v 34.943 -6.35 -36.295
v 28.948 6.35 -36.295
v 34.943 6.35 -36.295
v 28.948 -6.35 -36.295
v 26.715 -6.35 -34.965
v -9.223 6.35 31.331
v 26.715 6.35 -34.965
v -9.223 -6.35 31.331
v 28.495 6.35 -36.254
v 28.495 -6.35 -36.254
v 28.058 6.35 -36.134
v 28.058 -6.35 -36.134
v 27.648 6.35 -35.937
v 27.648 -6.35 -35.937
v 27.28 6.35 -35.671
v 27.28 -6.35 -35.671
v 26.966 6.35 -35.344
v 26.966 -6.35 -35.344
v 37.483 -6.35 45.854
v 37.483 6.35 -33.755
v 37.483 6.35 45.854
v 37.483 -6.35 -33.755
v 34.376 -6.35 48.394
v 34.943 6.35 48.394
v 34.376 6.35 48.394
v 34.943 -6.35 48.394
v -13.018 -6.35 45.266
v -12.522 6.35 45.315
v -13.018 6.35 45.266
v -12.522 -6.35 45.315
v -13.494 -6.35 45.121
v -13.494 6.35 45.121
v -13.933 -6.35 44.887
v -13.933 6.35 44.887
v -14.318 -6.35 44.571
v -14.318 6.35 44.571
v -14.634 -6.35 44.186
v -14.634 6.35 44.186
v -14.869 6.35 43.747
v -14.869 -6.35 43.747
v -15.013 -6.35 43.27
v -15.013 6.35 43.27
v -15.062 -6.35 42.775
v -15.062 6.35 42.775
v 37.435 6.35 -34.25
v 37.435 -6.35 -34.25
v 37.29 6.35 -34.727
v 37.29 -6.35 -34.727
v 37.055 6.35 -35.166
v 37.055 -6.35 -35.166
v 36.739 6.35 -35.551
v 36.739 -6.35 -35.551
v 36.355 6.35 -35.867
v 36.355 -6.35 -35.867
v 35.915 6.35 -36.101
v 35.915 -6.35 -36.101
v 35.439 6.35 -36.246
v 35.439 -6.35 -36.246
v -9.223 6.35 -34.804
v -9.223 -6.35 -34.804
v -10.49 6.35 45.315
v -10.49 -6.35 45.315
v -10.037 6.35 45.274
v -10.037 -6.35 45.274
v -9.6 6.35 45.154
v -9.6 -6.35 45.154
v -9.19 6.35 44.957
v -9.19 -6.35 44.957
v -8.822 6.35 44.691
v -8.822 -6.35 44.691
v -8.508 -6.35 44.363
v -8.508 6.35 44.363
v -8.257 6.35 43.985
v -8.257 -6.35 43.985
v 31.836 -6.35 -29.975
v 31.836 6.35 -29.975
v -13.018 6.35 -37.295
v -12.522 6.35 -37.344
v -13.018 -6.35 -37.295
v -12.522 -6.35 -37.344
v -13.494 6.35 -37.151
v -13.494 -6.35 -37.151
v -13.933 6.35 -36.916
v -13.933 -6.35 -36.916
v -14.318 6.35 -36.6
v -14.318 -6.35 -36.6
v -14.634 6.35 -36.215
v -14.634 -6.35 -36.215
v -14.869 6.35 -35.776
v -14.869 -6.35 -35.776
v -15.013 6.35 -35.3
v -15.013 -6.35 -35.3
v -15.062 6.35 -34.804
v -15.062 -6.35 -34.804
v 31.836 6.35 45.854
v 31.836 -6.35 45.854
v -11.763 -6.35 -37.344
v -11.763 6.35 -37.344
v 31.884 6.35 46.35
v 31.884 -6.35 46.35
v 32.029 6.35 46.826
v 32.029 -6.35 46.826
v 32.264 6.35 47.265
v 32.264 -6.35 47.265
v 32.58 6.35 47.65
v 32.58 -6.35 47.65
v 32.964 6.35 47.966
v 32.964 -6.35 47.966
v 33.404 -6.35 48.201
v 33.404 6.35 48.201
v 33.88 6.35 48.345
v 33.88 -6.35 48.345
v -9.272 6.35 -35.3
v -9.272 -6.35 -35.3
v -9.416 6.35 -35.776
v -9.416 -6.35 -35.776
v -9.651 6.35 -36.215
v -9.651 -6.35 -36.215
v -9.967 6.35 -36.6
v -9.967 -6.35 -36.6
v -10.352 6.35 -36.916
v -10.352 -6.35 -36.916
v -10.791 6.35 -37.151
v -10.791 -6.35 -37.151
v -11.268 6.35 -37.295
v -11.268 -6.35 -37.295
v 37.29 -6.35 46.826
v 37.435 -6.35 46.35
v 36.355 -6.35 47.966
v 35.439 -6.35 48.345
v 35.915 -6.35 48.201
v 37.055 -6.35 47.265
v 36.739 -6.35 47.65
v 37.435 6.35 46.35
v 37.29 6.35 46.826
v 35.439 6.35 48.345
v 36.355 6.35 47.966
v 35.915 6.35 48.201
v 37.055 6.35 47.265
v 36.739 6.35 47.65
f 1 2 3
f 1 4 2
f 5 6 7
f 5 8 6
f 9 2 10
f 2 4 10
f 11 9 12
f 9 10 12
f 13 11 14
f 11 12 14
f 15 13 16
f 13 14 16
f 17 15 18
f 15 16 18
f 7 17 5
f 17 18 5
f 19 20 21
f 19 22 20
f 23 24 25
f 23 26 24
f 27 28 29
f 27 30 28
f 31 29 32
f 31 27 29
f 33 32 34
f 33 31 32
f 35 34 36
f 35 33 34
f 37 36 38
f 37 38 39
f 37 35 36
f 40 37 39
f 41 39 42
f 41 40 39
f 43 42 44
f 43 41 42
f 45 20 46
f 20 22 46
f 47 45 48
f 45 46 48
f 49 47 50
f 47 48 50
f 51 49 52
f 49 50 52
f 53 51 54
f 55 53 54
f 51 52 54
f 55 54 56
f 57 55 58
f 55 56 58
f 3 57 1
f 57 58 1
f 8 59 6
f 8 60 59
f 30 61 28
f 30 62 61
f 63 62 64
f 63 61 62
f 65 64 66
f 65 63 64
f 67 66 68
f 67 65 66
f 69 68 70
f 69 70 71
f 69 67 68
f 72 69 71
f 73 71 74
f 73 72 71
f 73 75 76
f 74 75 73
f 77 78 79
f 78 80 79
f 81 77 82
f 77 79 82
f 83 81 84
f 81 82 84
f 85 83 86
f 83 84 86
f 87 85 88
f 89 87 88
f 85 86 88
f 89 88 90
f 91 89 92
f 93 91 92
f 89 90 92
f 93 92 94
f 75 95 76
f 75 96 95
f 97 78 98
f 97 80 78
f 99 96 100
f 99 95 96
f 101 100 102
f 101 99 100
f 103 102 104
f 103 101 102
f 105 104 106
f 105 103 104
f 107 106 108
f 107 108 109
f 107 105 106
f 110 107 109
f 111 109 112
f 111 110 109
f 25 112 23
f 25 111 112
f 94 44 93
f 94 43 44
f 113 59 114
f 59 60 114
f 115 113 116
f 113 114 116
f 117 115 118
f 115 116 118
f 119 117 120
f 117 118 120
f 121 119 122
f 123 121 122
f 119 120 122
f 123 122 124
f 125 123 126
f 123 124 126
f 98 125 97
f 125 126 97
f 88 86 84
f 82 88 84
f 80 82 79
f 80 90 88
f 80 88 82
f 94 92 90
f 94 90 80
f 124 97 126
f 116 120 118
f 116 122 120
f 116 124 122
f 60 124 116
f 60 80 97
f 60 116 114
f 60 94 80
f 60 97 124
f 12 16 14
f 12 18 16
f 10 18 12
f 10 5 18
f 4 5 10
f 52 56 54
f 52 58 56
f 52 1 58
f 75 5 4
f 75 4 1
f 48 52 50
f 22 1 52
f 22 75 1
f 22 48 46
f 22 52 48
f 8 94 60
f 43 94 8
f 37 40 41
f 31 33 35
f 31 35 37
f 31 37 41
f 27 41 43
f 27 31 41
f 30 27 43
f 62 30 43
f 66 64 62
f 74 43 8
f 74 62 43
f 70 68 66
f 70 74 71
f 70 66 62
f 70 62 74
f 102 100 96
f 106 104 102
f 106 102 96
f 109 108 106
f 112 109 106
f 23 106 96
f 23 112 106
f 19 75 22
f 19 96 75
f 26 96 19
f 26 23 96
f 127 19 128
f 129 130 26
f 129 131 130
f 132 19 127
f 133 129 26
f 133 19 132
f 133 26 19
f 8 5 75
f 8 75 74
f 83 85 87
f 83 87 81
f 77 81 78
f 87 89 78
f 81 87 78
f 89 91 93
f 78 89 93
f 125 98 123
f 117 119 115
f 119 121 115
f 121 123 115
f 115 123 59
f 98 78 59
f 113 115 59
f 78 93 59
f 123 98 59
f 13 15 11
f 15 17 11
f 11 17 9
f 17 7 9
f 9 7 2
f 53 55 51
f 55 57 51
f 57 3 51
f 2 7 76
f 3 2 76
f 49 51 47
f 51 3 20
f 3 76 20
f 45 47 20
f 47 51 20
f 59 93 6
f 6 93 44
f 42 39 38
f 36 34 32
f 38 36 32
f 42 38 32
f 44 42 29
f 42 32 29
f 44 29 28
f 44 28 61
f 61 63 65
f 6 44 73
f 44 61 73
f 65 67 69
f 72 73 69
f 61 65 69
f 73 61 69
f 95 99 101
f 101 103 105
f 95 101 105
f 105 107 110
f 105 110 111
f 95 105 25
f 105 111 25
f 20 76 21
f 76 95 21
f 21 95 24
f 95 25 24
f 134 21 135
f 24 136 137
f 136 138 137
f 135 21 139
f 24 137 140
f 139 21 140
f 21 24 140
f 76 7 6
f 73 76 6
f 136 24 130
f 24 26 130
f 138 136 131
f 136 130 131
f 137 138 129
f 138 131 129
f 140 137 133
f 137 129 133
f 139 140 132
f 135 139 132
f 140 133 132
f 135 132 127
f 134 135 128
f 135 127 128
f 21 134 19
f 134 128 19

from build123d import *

# Parameters (mm, degrees)
F1_DEPTH = 6.35
F2_R     = 2.54


with BuildPart() as f1:
    # F0 (on Front) → F1 (new body, symmetric)
    with BuildSketch(Plane.XZ):
        Polygon((-8.977415, 45.314699), (-15.062025, 45.314699), (-15.062025, -37.343994), (-9.223152, -37.343994), (-9.223152, 31.330701), (27.435317, -36.294828), (37.48342, -36.294828), (37.48342, 48.394047), (31.835622, 48.394047), (31.835622, -29.974949), align=None)
    extrude(amount=F1_DEPTH, both=True)

    # F2
    f2_edges = [f1.edges().sort_by_distance(p)[0] for p in [
        (-15.062025, 0, -37.343994),
        (37.48342, 0, 48.394047),
        (-15.062025, 0, 45.314699),
        (31.835622, 0, 48.394047),
        (-9.223152, 0, -37.343994),
        (37.48342, 0, -36.294828),
        (27.435317, 0, -36.294828),
        (-8.977415, 0, 45.314699),
    ]]
    fillet(f2_edges, radius=F2_R)


solid = f1.part
